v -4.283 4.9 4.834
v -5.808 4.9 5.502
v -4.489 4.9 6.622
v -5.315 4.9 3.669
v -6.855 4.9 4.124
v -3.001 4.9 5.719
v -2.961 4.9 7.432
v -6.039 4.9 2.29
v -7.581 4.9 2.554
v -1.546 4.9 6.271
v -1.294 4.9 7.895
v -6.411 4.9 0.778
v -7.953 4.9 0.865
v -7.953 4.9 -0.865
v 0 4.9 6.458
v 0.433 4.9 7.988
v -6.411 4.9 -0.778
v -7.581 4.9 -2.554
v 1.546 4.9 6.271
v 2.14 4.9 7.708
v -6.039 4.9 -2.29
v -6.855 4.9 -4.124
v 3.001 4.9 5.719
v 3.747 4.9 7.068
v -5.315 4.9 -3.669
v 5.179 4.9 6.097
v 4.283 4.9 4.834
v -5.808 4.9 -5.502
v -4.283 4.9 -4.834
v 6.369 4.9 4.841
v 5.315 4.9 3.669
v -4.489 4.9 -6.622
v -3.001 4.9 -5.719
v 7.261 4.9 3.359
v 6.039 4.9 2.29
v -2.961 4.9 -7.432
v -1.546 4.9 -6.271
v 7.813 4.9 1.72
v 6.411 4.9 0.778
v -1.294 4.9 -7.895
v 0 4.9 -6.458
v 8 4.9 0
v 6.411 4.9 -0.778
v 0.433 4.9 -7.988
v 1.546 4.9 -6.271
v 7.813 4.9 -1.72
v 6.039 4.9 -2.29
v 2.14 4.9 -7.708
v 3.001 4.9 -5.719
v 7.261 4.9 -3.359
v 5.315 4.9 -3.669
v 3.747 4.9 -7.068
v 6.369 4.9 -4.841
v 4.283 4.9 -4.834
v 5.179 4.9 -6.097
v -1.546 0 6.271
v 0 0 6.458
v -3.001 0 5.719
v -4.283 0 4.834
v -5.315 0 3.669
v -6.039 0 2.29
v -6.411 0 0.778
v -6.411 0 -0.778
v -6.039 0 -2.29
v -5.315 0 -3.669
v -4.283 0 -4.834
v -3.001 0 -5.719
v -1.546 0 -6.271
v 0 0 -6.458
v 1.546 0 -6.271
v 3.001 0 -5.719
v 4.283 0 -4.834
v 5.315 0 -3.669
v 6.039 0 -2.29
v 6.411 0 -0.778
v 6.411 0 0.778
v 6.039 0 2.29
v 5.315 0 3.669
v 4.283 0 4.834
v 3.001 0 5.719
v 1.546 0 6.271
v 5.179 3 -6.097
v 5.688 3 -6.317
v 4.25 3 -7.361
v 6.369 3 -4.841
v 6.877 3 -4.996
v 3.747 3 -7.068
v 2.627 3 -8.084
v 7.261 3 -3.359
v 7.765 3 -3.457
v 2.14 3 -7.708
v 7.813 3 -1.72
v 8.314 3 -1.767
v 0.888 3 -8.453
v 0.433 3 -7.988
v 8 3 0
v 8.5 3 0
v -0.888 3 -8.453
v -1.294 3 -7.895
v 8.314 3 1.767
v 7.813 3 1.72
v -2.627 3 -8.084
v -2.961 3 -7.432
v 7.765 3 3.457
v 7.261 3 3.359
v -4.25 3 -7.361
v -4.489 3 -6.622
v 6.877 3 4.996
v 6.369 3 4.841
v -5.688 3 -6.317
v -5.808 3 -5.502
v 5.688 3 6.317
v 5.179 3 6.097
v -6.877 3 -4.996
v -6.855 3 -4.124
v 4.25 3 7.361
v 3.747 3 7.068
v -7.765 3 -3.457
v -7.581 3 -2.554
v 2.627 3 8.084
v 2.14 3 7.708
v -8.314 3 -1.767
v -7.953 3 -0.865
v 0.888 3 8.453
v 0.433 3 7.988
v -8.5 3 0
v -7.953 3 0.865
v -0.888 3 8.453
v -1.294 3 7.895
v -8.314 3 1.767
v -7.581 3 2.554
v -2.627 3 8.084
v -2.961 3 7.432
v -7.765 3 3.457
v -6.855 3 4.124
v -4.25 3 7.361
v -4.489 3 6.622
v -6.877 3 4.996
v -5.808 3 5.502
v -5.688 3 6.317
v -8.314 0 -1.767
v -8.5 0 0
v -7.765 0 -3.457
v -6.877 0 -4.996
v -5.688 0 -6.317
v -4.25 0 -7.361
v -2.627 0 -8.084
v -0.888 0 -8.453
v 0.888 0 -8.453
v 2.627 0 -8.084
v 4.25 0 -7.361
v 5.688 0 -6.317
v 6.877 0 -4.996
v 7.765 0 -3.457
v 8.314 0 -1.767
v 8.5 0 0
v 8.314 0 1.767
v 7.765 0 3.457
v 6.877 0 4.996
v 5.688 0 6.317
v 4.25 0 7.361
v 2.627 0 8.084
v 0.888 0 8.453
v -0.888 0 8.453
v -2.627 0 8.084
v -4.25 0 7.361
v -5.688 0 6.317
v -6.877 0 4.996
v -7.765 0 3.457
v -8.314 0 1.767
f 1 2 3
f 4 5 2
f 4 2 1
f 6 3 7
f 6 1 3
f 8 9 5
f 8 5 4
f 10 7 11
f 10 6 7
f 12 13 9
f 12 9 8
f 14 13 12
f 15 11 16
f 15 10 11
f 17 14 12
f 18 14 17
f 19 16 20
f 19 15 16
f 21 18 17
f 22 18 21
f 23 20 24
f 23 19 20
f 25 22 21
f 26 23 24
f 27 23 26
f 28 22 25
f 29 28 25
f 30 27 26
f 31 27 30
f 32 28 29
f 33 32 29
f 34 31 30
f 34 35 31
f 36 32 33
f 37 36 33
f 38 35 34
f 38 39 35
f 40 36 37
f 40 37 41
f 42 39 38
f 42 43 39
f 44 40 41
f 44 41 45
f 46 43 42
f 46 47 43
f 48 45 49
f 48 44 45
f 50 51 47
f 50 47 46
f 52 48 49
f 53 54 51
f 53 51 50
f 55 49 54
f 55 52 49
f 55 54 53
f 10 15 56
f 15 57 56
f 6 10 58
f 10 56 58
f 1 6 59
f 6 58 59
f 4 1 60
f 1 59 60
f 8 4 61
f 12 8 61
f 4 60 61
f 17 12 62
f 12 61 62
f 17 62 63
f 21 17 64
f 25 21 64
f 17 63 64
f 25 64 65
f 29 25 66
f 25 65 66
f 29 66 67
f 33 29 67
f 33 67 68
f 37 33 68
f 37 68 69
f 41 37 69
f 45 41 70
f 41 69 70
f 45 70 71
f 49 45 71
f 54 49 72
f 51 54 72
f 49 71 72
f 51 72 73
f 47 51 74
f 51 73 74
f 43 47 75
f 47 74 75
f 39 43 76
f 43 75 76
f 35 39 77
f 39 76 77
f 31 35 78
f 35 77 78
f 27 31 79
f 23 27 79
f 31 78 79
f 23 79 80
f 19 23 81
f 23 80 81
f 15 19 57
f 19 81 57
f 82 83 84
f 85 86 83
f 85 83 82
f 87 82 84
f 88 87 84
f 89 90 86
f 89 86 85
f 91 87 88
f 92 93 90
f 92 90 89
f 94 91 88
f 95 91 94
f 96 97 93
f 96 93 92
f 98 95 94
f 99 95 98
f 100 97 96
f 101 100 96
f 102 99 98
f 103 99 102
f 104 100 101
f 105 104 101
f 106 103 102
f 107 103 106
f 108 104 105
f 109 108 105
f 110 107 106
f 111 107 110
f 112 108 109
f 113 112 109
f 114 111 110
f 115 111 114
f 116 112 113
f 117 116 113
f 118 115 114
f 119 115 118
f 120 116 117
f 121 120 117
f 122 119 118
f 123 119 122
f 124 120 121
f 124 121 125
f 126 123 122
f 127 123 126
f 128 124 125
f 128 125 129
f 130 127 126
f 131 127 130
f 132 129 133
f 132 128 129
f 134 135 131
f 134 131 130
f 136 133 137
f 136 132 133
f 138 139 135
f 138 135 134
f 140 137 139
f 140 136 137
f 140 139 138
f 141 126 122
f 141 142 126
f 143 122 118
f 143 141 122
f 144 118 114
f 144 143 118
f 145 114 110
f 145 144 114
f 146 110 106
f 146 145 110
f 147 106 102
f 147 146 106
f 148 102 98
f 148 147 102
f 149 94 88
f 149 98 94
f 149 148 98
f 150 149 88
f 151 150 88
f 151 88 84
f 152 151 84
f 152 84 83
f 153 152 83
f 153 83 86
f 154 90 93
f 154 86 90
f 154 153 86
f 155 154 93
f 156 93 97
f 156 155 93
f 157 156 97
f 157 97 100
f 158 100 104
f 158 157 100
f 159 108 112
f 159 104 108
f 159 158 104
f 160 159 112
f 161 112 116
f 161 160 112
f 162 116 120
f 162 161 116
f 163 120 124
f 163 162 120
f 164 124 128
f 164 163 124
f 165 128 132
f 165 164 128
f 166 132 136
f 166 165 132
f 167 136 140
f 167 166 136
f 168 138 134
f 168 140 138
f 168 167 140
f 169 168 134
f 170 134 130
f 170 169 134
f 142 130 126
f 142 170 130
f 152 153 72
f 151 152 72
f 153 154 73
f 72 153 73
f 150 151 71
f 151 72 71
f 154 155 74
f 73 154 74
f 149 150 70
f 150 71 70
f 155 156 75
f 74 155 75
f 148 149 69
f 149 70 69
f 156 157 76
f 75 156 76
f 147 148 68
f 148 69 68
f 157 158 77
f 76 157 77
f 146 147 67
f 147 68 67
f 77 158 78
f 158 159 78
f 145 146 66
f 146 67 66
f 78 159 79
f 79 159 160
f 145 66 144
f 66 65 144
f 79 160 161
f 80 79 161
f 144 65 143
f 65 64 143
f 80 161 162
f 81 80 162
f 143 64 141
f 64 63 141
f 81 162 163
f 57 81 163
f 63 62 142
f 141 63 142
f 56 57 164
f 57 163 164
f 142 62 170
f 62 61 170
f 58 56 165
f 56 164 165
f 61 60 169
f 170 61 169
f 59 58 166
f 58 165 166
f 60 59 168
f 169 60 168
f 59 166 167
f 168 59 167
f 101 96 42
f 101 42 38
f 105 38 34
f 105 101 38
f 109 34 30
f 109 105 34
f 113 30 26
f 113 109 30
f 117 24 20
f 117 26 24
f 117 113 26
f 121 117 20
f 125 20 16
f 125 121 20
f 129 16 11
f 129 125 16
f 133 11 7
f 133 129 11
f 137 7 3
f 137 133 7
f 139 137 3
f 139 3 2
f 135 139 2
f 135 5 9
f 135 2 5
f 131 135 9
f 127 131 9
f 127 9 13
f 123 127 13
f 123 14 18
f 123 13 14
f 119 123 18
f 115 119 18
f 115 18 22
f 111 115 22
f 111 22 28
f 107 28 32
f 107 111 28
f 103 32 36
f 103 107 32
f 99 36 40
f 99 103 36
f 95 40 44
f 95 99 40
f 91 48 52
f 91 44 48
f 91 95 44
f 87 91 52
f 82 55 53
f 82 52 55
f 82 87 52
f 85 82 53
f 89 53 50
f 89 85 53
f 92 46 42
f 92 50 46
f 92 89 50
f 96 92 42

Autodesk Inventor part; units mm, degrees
ref_plane "YZ Plane" through (0, 0, 0) normal (1, 0, 0) x (0, 1, 0)
ref_plane "XZ Plane" through (0, 0, 0) normal (0, 1, 0) x (-1, 0, 0)
ref_plane "XY Plane" through (0, 0, 0) normal (0, 0, 1) x (1, 0, 0)
sketch "Sketch1" plane through (0, 0, 0) normal (0, 1, 0) x (-1, 0, 0)
  circle A0 centre (0, 0) radius 8.5
  dimension "d0" = 17
extrude "Extrusion1" add sketch "Sketch1" along normal blind 3
sketch "Sketch2" plane through (0, 3, 0) normal (0, 1, 0) x (1, 0, 0)
  circle A0 centre (0, 0) radius 8.5 projected
  circle A1 centre (0, 0) radius 8
  dimension "d3" = 16
extrude "Extrusion2" add sketch "Sketch2" along normal blind 1.9 contours A1
sketch "Sketch3" plane through (0, 4.9, 0) normal (0, 1, 0) x (1, 0, 0)
  circle A0 centre (0, 0) radius 8 projected
hole "Hole1" at (0, 4.9, 0) direction (0, -1, 0) diameter 12.917 depth 33.1 tip angle 118 thread size "M14x1" class "6H" standard "ISO Metric profile"
properties part number "500-100" material "Steel"
